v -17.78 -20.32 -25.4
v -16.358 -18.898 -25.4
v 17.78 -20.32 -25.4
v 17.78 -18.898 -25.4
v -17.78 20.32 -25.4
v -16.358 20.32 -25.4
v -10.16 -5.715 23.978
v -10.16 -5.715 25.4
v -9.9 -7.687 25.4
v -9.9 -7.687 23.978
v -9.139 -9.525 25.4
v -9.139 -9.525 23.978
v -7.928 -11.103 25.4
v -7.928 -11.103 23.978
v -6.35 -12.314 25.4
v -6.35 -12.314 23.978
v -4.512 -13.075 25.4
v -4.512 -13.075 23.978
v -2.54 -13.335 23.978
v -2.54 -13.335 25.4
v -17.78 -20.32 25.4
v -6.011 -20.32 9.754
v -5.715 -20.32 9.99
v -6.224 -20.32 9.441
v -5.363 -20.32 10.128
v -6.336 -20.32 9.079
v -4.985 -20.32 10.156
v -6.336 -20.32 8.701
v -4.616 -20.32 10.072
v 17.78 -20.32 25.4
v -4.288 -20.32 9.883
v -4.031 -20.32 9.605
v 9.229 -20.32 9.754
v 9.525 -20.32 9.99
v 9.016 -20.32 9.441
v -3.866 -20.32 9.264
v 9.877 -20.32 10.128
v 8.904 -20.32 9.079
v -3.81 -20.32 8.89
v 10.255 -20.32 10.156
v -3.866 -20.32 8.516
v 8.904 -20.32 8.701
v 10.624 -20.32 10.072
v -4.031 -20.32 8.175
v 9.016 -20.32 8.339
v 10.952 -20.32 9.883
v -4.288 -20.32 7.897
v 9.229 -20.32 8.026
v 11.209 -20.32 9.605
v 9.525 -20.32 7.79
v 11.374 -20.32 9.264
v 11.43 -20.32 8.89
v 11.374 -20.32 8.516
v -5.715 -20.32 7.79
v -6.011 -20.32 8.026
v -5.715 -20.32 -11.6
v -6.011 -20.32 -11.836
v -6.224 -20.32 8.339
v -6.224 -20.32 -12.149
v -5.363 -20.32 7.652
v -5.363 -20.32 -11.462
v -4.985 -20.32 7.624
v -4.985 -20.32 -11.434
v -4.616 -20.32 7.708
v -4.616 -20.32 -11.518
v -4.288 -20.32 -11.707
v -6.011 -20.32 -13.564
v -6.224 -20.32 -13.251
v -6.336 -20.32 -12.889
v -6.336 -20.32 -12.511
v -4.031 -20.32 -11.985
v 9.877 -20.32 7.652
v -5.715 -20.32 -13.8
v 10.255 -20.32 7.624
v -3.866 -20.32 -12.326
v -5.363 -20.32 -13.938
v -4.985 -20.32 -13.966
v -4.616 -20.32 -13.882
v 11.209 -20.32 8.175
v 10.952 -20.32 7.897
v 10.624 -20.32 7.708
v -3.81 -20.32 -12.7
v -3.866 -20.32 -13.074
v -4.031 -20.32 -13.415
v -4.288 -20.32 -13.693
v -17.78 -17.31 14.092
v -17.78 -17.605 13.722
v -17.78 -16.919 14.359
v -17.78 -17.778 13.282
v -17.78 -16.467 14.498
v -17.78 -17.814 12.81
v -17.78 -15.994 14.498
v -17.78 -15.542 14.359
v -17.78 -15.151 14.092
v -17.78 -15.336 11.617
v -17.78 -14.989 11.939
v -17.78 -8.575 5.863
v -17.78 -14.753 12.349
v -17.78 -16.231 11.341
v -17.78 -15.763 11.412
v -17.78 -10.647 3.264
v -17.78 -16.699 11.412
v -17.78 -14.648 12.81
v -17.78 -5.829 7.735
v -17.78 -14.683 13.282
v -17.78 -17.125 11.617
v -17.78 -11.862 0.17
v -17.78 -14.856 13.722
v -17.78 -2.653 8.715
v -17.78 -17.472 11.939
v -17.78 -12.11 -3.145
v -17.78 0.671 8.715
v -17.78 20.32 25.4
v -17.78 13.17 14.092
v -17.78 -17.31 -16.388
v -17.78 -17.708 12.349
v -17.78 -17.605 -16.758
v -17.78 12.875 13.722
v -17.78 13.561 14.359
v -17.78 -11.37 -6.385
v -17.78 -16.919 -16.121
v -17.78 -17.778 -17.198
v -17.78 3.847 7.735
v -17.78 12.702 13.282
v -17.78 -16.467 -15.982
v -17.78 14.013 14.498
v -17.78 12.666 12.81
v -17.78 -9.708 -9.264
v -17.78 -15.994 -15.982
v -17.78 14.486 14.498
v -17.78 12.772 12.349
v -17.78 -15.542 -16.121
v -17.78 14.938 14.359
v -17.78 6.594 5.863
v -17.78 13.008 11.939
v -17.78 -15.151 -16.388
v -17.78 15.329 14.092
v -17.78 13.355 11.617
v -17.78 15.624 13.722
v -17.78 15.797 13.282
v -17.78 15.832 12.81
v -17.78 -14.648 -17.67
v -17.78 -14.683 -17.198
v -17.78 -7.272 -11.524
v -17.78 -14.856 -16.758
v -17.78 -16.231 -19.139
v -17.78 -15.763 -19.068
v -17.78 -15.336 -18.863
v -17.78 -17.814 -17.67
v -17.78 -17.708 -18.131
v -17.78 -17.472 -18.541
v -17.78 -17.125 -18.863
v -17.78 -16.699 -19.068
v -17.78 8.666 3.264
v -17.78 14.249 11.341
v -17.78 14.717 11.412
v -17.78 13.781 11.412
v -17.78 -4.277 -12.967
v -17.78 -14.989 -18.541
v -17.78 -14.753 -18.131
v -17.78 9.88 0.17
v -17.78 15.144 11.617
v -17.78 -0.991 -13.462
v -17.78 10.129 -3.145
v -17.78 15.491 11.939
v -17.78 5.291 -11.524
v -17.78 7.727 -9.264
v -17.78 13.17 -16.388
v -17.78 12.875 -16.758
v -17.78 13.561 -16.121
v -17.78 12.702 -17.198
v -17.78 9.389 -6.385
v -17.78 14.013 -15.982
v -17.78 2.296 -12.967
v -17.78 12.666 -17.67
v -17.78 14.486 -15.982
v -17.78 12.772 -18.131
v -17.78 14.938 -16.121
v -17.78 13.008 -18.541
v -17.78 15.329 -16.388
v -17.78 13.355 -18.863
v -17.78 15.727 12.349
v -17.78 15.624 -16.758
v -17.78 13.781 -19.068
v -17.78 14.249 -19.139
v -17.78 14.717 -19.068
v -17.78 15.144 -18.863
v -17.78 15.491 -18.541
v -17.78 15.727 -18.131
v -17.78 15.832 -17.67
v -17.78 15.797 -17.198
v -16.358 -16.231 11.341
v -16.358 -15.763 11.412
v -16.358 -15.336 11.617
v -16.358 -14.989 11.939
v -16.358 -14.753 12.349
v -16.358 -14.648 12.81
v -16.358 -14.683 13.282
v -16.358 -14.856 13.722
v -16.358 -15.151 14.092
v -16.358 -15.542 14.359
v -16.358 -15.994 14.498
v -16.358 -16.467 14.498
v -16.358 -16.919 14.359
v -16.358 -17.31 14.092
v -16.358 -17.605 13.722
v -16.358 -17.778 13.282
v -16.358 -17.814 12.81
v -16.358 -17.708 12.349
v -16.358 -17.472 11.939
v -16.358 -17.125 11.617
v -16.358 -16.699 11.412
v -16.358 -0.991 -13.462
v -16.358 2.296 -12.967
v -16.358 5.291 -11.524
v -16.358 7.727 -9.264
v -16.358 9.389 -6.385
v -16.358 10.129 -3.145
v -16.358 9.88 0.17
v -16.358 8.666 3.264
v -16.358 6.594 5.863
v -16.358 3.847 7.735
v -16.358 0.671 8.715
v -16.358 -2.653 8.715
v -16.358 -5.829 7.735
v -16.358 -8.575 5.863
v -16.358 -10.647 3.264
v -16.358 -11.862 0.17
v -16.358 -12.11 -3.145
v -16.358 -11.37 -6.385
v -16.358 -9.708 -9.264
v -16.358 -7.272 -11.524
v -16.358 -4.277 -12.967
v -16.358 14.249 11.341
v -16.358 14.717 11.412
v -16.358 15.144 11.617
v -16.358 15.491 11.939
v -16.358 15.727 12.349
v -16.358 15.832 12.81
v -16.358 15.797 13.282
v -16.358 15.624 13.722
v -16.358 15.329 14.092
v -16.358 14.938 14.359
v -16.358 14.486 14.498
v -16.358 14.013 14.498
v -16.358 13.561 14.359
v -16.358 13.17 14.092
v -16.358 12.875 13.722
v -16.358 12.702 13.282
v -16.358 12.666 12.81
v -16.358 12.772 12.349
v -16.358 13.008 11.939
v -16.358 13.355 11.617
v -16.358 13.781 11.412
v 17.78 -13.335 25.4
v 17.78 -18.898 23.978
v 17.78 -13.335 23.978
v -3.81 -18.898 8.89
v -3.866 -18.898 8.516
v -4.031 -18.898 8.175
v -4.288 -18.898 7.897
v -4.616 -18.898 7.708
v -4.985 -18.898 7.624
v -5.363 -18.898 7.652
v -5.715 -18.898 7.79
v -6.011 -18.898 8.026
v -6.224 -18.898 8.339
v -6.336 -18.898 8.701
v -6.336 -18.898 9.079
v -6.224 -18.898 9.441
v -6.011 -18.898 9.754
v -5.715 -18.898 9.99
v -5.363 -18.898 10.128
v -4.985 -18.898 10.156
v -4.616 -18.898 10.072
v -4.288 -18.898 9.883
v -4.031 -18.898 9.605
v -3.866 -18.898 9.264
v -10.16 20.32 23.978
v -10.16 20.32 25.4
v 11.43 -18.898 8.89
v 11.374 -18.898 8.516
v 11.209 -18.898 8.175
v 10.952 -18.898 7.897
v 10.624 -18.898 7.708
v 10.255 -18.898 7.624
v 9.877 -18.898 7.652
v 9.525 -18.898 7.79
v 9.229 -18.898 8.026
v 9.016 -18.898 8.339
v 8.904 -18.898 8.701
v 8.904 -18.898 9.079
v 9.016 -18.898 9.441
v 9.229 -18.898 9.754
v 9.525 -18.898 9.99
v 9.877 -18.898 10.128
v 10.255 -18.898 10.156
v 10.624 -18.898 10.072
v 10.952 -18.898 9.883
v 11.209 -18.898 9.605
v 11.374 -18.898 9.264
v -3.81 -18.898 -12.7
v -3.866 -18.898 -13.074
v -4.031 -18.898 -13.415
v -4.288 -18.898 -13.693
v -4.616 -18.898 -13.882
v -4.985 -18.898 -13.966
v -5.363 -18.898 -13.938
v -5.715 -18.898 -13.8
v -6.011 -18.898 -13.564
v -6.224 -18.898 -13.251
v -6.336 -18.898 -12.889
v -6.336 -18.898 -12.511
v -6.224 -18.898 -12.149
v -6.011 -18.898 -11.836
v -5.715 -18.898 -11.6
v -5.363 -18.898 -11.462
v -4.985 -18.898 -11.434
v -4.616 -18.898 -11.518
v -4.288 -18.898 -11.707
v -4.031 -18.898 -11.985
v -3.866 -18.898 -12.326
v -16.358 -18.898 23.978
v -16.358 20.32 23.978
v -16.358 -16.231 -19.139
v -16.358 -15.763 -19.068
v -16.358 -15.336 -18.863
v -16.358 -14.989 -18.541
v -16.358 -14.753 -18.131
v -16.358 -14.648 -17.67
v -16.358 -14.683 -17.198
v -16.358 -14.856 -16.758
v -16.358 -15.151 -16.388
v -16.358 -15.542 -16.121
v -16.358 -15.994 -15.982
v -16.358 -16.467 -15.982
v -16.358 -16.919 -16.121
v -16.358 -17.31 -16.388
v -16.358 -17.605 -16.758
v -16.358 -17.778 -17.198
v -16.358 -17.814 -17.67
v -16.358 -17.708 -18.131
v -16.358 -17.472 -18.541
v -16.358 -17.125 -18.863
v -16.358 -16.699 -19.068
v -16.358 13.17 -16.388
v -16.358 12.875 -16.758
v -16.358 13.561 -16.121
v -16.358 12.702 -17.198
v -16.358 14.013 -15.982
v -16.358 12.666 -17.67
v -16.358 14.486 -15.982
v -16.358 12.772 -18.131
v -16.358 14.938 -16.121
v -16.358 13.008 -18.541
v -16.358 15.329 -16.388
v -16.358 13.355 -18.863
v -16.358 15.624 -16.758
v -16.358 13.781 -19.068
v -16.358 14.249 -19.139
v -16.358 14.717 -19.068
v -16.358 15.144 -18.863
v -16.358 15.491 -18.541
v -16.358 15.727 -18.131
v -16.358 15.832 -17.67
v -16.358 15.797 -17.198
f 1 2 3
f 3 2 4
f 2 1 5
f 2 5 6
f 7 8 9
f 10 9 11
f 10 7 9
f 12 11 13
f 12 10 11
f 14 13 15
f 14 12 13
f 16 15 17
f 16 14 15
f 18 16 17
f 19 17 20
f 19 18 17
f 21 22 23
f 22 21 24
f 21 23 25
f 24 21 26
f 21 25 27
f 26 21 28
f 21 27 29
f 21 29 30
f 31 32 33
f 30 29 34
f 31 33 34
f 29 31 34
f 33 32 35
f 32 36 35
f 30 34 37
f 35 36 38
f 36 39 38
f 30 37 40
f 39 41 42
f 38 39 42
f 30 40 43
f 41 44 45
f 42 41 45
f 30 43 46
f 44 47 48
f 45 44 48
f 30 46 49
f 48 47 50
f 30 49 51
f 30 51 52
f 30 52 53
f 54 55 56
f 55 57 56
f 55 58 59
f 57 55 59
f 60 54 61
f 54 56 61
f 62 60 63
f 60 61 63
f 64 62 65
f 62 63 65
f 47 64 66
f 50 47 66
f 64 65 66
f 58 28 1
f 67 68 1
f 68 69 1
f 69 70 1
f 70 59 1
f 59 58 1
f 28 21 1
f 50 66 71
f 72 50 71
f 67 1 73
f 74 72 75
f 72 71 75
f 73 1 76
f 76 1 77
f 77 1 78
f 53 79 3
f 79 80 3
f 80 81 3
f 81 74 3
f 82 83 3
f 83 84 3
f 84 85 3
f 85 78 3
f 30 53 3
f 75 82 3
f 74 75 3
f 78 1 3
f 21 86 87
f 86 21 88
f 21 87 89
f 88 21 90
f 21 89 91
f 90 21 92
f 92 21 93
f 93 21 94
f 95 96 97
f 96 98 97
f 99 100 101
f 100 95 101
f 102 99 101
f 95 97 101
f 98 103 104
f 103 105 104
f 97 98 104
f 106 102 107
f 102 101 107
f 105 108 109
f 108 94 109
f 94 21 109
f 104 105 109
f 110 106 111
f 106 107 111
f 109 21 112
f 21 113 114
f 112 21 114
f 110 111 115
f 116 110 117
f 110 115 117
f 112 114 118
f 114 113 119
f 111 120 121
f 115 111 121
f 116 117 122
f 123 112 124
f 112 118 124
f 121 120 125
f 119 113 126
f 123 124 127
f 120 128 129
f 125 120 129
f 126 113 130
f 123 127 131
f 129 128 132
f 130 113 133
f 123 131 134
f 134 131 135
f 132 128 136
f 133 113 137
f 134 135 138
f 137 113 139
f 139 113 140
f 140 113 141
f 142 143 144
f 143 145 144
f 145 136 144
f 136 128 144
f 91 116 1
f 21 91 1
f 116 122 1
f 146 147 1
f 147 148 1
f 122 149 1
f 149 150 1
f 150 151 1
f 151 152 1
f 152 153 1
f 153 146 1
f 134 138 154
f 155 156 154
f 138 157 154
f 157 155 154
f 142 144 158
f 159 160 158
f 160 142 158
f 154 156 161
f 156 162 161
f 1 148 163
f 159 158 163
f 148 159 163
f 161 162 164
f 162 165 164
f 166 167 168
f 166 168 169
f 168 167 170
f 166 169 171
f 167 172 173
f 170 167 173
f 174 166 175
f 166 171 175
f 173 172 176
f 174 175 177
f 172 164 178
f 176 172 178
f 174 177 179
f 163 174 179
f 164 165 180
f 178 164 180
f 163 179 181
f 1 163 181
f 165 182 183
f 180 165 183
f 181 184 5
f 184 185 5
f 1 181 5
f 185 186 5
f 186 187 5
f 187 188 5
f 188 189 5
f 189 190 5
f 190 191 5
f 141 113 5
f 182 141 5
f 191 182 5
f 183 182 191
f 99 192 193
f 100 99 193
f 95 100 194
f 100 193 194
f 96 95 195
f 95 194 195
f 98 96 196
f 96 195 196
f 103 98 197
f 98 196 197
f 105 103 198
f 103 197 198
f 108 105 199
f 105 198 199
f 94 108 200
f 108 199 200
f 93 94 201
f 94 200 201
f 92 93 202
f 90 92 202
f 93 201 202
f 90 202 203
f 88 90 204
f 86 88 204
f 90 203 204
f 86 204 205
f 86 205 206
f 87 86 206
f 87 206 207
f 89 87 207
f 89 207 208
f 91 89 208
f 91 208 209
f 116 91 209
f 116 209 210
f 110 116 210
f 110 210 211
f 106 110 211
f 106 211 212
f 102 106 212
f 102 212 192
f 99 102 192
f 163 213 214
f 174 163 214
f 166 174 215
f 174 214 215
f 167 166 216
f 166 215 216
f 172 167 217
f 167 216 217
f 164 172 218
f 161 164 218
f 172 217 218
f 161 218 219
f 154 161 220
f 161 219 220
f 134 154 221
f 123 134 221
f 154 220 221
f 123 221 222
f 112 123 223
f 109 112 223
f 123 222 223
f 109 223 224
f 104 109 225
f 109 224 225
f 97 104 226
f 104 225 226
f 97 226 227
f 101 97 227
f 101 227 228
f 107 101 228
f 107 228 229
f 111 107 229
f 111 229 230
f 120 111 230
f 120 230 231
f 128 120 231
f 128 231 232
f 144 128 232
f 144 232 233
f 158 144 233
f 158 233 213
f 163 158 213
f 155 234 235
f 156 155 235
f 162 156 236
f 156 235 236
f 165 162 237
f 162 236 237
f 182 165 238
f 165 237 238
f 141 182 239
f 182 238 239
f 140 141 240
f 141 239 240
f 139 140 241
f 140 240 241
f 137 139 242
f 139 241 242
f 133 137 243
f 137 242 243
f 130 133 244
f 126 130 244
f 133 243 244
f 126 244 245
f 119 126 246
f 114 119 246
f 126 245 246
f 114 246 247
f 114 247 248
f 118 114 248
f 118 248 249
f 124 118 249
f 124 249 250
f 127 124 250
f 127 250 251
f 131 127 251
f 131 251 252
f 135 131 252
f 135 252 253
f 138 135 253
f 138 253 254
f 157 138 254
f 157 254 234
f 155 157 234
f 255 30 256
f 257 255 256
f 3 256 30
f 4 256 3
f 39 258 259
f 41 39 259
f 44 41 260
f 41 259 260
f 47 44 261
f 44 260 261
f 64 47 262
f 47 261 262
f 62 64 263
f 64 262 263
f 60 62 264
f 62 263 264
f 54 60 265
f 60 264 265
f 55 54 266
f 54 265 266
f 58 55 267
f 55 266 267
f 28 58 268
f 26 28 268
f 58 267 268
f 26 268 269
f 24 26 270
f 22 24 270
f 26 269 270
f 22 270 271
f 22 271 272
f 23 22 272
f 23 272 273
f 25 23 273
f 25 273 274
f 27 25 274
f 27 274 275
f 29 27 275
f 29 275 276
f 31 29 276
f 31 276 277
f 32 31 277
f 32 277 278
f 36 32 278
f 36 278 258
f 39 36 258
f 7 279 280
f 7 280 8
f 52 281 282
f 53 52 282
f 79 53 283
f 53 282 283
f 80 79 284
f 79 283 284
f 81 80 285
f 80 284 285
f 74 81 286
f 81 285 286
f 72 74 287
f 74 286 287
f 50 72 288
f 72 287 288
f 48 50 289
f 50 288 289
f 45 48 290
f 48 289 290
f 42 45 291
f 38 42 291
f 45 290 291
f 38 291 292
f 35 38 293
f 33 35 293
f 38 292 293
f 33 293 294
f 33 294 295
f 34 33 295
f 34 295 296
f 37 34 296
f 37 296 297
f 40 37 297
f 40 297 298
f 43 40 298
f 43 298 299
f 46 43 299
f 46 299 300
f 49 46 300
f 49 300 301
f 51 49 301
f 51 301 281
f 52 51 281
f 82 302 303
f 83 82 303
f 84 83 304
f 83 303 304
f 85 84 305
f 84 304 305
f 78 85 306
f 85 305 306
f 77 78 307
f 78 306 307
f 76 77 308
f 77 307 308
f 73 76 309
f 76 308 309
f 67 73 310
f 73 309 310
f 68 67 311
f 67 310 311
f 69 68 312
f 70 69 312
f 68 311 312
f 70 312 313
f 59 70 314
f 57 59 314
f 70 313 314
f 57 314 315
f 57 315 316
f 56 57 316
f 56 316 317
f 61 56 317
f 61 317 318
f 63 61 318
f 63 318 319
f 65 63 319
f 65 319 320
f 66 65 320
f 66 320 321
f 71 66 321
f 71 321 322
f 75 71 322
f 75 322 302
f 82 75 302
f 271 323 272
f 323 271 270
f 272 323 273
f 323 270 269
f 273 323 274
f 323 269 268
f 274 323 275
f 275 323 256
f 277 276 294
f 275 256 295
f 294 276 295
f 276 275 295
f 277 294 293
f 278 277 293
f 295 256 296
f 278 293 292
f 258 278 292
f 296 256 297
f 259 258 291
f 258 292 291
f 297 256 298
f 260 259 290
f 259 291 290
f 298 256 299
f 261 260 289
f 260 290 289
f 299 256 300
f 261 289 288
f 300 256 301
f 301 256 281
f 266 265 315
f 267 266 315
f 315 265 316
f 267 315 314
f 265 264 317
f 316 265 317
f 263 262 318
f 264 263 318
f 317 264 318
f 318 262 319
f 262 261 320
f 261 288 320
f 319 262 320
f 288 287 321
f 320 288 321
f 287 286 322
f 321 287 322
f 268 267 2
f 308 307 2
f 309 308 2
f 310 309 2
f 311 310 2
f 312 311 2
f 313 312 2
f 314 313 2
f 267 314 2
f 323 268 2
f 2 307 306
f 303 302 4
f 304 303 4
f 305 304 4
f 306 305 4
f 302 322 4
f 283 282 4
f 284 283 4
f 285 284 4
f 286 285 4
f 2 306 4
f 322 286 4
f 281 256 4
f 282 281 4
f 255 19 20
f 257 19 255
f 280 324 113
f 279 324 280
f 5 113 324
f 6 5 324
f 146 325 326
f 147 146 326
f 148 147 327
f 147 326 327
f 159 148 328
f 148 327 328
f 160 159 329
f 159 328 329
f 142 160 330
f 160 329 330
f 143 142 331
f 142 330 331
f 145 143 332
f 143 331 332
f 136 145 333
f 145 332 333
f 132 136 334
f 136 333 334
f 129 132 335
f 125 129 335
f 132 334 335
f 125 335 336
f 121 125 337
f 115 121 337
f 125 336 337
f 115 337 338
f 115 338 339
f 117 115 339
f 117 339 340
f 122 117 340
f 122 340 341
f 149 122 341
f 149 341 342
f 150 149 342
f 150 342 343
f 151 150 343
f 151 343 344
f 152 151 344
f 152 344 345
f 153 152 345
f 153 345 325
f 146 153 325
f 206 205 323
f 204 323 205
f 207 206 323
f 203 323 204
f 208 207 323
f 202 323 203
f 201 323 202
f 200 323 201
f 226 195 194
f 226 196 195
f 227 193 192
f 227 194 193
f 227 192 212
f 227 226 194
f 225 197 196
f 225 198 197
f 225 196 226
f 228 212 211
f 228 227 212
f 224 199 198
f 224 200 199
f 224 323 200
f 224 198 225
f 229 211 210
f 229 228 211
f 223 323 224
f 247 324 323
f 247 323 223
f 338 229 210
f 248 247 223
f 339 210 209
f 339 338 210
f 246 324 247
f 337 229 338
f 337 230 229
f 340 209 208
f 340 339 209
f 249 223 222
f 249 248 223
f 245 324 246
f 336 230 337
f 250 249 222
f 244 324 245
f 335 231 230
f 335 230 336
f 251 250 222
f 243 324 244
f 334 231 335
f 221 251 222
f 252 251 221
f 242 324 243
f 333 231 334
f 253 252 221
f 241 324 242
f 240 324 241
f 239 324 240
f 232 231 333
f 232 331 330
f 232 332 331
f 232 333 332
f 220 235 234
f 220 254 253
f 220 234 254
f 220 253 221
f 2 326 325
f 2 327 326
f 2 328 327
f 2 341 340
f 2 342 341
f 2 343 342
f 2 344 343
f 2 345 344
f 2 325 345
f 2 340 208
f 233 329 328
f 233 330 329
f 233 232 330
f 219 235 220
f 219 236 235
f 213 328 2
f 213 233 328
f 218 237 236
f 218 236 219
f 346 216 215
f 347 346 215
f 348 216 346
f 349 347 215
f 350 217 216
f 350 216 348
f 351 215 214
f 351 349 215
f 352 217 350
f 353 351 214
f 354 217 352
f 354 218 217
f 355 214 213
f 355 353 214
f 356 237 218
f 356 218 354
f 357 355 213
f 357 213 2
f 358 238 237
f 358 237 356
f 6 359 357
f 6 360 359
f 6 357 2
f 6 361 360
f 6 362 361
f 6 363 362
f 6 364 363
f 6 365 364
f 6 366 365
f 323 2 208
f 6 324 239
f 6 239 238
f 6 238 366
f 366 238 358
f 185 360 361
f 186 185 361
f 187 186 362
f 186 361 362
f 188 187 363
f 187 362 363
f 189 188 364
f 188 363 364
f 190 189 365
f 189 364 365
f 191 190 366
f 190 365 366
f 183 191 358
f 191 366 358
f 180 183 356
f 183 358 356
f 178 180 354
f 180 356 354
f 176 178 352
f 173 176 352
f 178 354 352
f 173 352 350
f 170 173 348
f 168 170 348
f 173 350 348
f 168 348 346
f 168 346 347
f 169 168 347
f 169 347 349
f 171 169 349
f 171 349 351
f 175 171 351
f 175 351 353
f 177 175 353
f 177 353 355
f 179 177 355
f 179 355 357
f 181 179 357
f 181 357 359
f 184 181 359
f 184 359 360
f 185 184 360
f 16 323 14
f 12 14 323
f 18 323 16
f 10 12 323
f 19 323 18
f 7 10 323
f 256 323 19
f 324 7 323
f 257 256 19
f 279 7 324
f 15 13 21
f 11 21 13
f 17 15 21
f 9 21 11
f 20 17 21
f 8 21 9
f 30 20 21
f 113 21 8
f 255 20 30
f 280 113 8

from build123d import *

# Parameters (mm, degrees)
SKETCH1_W           = 35.56
SKETCH1_H           = 50.8
BOSS_EXTRUDE1_DEPTH = 20.32
SKETCH2_W           = 49.3776
SKETCH2_H           = 39.2176
CUT_EXTRUDE1_DEPTH  = 34.1376
SKETCH3_R           = 1.27
CUT_EXTRUDE2_DEPTH  = 2.4224
CUT_EXTRUDE3_DEPTH  = 2.4224
SKETCH7_R           = 11.1506
SKETCH7_R_2         = 1.5875
CUT_EXTRUDE4_DEPTH  = 2.4224


with BuildPart() as part:
    # Sketch1 → Boss-Extrude1 (new body, symmetric)
    with BuildSketch(Plane(origin=(0, 0, 0), x_dir=(1, 0, 0), z_dir=(0, 1, 0))):
        Rectangle(SKETCH1_W, SKETCH1_H)
    extrude(amount=BOSS_EXTRUDE1_DEPTH, both=True)

    # Sketch2 → Cut-Extrude1 (cut)
    with BuildSketch(Plane(origin=(17.78, 0, 0), x_dir=(0, 0, -1), z_dir=(1, 0, 0))):
        with Locations((0.7112, 0.7112)):
            Rectangle(SKETCH2_W, SKETCH2_H)
    extrude(amount=-CUT_EXTRUDE1_DEPTH, mode=Mode.SUBTRACT)

    # Sketch3 → Cut-Extrude2 (cut, through all)
    with BuildSketch(Plane(origin=(0, -18.8976, 0), x_dir=(1, 0, 0), z_dir=(0, 1, 0))):
        with Locations((-5.08, -8.89)):
            Circle(SKETCH3_R)
        with Locations((10.16, -8.89)):
            Circle(SKETCH3_R)
        with Locations((-5.08, 12.7)):
            Circle(SKETCH3_R)
    extrude(amount=-CUT_EXTRUDE2_DEPTH, mode=Mode.SUBTRACT)

    # Sketch6 → Cut-Extrude3 (cut, through all)
    with BuildSketch(Plane(origin=(0, 0, 23.9776), x_dir=(-1, 0, 0), z_dir=(0, 0, -1))):
        with BuildLine():
            Line((-17.78, -13.335), (-17.78, 20.32))
            Line((-17.78, 20.32), (10.16, 20.32))
            Line((10.16, 20.32), (10.16, -5.715))
            ThreePointArc((10.16, -5.715), (7.928153673, -11.103153673), (2.54, -13.335))
            Line((2.54, -13.335), (-17.78, -13.335))
        make_face()
    extrude(amount=-CUT_EXTRUDE3_DEPTH, mode=Mode.SUBTRACT)

    # Sketch7 → Cut-Extrude4 (cut, through all)
    with BuildSketch(Plane(origin=(-16.3576, 0, 0), x_dir=(0, 0, -1), z_dir=(1, 0, 0))):
        with Locations((2.3114, -0.9906)):
            Circle(SKETCH7_R)
        with Locations((-12.9286, 14.2494)):
            Circle(SKETCH7_R_2)
        with Locations((17.5514, 14.2494)):
            Circle(SKETCH7_R_2)
        with Locations((17.5514, -16.2306)):
            Circle(SKETCH7_R_2)
        with Locations((-12.9286, -16.2306)):
            Circle(SKETCH7_R_2)
    extrude(amount=-CUT_EXTRUDE4_DEPTH, mode=Mode.SUBTRACT)


solid = part.part
